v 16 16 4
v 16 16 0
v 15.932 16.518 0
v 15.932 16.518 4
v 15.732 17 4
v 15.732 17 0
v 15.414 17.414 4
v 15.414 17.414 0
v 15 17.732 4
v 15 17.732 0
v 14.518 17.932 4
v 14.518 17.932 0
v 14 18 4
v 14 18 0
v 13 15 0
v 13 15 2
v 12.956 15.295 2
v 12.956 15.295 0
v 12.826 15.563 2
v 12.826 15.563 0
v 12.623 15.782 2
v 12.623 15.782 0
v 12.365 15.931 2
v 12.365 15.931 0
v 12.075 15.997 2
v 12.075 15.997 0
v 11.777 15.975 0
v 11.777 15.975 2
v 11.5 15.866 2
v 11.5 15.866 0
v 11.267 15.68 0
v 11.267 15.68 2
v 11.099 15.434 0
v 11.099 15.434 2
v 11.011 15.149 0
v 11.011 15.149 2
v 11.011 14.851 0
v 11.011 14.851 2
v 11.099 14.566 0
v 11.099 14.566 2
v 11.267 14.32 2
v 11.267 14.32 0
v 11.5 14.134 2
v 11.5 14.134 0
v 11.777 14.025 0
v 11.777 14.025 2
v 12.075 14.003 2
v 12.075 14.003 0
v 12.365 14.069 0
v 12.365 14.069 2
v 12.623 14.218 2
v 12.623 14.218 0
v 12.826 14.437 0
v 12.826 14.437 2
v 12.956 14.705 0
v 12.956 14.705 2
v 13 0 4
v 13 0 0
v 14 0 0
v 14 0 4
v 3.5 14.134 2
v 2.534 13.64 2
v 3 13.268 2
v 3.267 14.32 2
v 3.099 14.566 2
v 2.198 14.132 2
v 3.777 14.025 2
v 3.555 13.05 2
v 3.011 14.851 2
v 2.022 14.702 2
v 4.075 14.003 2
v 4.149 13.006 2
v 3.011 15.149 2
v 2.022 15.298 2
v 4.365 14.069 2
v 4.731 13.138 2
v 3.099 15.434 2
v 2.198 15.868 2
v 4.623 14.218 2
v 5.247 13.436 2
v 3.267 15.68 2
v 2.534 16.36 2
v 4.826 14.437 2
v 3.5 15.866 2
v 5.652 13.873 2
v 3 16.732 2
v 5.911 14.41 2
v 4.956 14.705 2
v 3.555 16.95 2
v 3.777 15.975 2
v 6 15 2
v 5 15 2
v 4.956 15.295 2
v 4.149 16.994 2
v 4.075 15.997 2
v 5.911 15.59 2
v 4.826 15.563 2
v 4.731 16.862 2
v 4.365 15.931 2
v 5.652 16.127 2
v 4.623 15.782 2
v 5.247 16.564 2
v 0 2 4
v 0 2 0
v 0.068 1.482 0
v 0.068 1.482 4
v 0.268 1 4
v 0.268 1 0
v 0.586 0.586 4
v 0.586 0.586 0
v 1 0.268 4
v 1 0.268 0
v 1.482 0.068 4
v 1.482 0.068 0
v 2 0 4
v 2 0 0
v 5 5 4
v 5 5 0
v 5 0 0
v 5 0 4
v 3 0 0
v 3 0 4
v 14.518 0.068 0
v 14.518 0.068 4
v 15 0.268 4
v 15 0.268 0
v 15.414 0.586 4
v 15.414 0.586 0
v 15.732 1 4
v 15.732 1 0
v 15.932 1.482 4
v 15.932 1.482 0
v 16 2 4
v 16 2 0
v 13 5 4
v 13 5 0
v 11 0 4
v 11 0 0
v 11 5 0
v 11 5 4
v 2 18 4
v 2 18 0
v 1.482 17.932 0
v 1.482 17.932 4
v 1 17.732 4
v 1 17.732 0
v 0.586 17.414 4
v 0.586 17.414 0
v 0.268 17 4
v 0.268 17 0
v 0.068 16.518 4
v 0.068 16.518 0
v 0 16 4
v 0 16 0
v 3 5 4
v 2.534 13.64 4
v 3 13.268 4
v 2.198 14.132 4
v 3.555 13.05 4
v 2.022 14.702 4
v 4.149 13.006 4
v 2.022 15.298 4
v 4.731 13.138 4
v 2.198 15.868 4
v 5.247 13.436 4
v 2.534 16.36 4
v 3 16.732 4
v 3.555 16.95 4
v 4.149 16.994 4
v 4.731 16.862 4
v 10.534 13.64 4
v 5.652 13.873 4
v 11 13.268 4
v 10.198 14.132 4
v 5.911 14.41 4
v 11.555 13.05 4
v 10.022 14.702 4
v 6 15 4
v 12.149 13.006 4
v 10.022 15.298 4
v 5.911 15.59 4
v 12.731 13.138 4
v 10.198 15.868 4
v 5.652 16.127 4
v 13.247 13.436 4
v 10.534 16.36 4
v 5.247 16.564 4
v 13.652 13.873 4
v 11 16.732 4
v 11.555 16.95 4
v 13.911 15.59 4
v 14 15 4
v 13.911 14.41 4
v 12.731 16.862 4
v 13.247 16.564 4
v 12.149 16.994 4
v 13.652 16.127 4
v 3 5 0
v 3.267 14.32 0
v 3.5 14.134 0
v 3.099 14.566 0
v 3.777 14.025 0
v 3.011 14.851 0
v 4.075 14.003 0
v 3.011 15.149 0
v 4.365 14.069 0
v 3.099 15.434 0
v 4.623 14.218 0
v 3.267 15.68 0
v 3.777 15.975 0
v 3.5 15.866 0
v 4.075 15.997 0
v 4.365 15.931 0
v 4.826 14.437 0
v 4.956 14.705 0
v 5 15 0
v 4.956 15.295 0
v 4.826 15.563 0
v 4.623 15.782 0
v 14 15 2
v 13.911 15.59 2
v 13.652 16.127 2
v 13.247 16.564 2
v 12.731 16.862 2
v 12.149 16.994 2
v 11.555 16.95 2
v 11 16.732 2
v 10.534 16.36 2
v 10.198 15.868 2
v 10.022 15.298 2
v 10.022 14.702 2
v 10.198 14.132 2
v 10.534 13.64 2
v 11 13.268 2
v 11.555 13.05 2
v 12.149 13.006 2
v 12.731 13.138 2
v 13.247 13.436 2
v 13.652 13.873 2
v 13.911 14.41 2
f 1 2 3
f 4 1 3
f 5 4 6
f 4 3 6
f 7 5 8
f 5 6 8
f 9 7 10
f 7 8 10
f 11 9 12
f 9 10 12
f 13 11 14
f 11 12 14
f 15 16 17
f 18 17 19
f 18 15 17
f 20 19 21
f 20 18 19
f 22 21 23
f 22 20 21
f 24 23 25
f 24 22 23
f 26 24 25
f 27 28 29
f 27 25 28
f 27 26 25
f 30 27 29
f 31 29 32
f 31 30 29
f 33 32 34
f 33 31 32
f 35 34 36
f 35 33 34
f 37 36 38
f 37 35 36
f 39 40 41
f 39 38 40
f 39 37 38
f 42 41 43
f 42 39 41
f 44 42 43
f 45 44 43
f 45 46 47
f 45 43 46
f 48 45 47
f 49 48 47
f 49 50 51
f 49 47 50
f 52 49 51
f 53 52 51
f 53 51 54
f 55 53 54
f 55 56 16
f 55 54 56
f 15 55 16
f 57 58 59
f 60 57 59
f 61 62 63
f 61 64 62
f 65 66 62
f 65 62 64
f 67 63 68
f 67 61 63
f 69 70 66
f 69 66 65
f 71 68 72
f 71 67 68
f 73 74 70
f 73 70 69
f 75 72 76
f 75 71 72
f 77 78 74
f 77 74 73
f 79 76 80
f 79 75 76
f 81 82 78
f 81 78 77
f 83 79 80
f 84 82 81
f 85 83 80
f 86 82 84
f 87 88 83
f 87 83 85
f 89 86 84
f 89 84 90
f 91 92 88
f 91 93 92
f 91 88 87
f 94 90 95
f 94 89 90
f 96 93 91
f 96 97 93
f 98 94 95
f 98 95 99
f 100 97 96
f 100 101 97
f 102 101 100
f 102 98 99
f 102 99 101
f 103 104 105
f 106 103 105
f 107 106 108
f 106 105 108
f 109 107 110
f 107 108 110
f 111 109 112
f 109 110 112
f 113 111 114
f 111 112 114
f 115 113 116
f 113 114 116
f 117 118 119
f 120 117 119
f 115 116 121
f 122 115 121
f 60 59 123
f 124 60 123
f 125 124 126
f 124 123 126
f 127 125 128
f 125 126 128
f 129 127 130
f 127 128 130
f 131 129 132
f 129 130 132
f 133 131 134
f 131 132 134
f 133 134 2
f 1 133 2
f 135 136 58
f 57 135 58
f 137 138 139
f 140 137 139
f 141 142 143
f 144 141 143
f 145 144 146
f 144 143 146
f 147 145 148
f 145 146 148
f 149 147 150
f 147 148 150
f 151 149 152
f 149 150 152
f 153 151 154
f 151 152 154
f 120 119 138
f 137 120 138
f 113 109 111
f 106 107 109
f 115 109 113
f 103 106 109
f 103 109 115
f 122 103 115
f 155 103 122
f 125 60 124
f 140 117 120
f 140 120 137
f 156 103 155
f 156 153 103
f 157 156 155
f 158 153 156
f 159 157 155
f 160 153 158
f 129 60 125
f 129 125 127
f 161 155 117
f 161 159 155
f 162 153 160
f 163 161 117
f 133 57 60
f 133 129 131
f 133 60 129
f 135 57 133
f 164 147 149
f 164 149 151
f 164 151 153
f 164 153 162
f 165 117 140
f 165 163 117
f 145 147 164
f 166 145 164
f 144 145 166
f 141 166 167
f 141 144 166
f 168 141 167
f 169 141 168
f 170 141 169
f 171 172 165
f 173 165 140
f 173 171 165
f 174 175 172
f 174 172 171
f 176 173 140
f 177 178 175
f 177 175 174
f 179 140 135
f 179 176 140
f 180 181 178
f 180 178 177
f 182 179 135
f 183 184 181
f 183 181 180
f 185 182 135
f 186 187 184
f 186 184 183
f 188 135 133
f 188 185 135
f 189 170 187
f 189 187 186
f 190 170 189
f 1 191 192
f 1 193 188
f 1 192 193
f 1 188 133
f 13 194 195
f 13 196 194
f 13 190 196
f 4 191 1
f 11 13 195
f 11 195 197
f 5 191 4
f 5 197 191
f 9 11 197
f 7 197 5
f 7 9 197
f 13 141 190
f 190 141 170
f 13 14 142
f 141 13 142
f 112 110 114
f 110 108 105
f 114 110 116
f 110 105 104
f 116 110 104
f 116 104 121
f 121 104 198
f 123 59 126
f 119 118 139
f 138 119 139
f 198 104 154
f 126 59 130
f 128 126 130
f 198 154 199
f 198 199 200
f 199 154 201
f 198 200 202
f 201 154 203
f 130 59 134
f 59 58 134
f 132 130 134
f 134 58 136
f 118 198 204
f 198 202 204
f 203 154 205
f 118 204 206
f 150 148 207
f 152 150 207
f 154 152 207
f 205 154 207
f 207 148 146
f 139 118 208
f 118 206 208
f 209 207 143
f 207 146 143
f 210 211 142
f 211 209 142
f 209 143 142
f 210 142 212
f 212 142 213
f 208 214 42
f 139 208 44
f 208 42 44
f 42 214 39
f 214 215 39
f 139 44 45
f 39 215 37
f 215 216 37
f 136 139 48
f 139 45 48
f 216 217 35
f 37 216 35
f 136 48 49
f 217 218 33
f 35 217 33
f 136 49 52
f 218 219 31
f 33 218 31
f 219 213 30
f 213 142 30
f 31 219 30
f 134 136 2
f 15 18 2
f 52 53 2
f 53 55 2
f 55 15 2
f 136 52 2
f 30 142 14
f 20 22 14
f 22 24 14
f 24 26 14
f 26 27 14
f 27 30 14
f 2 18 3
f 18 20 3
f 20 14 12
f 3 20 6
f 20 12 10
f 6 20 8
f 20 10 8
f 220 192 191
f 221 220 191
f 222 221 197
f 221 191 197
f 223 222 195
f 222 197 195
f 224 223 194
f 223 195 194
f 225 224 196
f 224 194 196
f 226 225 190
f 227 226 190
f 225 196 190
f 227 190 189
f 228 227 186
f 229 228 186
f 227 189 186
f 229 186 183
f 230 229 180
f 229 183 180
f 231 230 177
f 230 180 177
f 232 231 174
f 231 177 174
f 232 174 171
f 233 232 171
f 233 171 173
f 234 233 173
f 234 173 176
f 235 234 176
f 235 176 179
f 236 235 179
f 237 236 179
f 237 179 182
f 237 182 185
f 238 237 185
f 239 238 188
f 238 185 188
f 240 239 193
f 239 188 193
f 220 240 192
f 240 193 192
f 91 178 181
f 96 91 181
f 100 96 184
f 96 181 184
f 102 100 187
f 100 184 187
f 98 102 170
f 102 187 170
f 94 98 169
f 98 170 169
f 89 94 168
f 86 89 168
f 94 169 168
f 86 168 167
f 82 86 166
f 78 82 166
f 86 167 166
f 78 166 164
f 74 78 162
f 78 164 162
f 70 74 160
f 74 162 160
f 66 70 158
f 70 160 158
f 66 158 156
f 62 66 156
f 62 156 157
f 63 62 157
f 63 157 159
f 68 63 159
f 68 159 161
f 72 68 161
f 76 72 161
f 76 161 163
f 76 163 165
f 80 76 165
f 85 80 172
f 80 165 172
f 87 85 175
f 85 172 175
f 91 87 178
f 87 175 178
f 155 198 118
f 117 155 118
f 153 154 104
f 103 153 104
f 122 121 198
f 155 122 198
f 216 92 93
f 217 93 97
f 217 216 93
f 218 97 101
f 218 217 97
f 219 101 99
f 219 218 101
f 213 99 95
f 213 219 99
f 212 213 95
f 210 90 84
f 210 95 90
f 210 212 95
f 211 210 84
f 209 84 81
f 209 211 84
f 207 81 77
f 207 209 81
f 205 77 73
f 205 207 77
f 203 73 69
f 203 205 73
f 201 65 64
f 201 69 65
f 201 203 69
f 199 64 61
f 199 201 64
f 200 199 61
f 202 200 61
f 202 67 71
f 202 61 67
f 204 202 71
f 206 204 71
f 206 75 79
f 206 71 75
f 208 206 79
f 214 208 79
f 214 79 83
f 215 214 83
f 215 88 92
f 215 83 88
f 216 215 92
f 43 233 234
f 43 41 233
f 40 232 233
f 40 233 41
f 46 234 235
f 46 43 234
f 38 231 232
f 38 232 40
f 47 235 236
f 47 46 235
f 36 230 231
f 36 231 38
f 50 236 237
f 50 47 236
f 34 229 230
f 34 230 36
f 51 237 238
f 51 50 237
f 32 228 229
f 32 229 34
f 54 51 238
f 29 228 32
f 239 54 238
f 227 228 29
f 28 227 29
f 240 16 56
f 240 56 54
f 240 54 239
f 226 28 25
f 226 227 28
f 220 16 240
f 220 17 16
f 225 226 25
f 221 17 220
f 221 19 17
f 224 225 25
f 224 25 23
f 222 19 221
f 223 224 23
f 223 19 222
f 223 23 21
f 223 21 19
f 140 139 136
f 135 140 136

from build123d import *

# Parameters (mm, degrees)
MODEL_R             = 1
BOSS_EXTRUDE1_DEPTH = 4
SKETCH2_R           = 2
CUT_EXTRUDE1_DEPTH  = 2


with BuildPart() as part:
    # Model → Boss-Extrude1 (new body)
    with BuildSketch(Plane.XY):
        with BuildLine():
            Line((2, 0), (3, 0))
            Line((3, 0), (3, 5))
            Line((3, 5), (5, 5))
            Line((5, 5), (5, 0))
            Line((5, 0), (11, 0))
            Line((11, 0), (11, 5))
            Line((11, 5), (13, 5))
            Line((13, 5), (13, 0))
            Line((13, 0), (14, 0))
            ThreePointArc((14, 0), (15.414213562, 0.585786438), (16, 2))
            Line((16, 2), (16, 16))
            ThreePointArc((16, 16), (15.414213562, 17.414213562), (14, 18))
            Line((14, 18), (2, 18))
            ThreePointArc((2, 18), (0.585786438, 17.414213562), (0, 16))
            Line((0, 16), (0, 2))
            ThreePointArc((0, 2), (0.585786438, 0.585786438), (2, 0))
        make_face()
        with Locations((4, 15)):
            Circle(MODEL_R, mode=Mode.SUBTRACT)
        with Locations((12, 15)):
            Circle(MODEL_R, mode=Mode.SUBTRACT)
    extrude(amount=BOSS_EXTRUDE1_DEPTH)

    # Sketch2 → Cut-Extrude1 (cut)
    with BuildSketch(Plane.XY.offset(4)):
        with Locations((4, 15)):
            Circle(SKETCH2_R)
        with Locations((12, 15)):
            Circle(SKETCH2_R)
    extrude(amount=-CUT_EXTRUDE1_DEPTH, mode=Mode.SUBTRACT)


solid = part.part
